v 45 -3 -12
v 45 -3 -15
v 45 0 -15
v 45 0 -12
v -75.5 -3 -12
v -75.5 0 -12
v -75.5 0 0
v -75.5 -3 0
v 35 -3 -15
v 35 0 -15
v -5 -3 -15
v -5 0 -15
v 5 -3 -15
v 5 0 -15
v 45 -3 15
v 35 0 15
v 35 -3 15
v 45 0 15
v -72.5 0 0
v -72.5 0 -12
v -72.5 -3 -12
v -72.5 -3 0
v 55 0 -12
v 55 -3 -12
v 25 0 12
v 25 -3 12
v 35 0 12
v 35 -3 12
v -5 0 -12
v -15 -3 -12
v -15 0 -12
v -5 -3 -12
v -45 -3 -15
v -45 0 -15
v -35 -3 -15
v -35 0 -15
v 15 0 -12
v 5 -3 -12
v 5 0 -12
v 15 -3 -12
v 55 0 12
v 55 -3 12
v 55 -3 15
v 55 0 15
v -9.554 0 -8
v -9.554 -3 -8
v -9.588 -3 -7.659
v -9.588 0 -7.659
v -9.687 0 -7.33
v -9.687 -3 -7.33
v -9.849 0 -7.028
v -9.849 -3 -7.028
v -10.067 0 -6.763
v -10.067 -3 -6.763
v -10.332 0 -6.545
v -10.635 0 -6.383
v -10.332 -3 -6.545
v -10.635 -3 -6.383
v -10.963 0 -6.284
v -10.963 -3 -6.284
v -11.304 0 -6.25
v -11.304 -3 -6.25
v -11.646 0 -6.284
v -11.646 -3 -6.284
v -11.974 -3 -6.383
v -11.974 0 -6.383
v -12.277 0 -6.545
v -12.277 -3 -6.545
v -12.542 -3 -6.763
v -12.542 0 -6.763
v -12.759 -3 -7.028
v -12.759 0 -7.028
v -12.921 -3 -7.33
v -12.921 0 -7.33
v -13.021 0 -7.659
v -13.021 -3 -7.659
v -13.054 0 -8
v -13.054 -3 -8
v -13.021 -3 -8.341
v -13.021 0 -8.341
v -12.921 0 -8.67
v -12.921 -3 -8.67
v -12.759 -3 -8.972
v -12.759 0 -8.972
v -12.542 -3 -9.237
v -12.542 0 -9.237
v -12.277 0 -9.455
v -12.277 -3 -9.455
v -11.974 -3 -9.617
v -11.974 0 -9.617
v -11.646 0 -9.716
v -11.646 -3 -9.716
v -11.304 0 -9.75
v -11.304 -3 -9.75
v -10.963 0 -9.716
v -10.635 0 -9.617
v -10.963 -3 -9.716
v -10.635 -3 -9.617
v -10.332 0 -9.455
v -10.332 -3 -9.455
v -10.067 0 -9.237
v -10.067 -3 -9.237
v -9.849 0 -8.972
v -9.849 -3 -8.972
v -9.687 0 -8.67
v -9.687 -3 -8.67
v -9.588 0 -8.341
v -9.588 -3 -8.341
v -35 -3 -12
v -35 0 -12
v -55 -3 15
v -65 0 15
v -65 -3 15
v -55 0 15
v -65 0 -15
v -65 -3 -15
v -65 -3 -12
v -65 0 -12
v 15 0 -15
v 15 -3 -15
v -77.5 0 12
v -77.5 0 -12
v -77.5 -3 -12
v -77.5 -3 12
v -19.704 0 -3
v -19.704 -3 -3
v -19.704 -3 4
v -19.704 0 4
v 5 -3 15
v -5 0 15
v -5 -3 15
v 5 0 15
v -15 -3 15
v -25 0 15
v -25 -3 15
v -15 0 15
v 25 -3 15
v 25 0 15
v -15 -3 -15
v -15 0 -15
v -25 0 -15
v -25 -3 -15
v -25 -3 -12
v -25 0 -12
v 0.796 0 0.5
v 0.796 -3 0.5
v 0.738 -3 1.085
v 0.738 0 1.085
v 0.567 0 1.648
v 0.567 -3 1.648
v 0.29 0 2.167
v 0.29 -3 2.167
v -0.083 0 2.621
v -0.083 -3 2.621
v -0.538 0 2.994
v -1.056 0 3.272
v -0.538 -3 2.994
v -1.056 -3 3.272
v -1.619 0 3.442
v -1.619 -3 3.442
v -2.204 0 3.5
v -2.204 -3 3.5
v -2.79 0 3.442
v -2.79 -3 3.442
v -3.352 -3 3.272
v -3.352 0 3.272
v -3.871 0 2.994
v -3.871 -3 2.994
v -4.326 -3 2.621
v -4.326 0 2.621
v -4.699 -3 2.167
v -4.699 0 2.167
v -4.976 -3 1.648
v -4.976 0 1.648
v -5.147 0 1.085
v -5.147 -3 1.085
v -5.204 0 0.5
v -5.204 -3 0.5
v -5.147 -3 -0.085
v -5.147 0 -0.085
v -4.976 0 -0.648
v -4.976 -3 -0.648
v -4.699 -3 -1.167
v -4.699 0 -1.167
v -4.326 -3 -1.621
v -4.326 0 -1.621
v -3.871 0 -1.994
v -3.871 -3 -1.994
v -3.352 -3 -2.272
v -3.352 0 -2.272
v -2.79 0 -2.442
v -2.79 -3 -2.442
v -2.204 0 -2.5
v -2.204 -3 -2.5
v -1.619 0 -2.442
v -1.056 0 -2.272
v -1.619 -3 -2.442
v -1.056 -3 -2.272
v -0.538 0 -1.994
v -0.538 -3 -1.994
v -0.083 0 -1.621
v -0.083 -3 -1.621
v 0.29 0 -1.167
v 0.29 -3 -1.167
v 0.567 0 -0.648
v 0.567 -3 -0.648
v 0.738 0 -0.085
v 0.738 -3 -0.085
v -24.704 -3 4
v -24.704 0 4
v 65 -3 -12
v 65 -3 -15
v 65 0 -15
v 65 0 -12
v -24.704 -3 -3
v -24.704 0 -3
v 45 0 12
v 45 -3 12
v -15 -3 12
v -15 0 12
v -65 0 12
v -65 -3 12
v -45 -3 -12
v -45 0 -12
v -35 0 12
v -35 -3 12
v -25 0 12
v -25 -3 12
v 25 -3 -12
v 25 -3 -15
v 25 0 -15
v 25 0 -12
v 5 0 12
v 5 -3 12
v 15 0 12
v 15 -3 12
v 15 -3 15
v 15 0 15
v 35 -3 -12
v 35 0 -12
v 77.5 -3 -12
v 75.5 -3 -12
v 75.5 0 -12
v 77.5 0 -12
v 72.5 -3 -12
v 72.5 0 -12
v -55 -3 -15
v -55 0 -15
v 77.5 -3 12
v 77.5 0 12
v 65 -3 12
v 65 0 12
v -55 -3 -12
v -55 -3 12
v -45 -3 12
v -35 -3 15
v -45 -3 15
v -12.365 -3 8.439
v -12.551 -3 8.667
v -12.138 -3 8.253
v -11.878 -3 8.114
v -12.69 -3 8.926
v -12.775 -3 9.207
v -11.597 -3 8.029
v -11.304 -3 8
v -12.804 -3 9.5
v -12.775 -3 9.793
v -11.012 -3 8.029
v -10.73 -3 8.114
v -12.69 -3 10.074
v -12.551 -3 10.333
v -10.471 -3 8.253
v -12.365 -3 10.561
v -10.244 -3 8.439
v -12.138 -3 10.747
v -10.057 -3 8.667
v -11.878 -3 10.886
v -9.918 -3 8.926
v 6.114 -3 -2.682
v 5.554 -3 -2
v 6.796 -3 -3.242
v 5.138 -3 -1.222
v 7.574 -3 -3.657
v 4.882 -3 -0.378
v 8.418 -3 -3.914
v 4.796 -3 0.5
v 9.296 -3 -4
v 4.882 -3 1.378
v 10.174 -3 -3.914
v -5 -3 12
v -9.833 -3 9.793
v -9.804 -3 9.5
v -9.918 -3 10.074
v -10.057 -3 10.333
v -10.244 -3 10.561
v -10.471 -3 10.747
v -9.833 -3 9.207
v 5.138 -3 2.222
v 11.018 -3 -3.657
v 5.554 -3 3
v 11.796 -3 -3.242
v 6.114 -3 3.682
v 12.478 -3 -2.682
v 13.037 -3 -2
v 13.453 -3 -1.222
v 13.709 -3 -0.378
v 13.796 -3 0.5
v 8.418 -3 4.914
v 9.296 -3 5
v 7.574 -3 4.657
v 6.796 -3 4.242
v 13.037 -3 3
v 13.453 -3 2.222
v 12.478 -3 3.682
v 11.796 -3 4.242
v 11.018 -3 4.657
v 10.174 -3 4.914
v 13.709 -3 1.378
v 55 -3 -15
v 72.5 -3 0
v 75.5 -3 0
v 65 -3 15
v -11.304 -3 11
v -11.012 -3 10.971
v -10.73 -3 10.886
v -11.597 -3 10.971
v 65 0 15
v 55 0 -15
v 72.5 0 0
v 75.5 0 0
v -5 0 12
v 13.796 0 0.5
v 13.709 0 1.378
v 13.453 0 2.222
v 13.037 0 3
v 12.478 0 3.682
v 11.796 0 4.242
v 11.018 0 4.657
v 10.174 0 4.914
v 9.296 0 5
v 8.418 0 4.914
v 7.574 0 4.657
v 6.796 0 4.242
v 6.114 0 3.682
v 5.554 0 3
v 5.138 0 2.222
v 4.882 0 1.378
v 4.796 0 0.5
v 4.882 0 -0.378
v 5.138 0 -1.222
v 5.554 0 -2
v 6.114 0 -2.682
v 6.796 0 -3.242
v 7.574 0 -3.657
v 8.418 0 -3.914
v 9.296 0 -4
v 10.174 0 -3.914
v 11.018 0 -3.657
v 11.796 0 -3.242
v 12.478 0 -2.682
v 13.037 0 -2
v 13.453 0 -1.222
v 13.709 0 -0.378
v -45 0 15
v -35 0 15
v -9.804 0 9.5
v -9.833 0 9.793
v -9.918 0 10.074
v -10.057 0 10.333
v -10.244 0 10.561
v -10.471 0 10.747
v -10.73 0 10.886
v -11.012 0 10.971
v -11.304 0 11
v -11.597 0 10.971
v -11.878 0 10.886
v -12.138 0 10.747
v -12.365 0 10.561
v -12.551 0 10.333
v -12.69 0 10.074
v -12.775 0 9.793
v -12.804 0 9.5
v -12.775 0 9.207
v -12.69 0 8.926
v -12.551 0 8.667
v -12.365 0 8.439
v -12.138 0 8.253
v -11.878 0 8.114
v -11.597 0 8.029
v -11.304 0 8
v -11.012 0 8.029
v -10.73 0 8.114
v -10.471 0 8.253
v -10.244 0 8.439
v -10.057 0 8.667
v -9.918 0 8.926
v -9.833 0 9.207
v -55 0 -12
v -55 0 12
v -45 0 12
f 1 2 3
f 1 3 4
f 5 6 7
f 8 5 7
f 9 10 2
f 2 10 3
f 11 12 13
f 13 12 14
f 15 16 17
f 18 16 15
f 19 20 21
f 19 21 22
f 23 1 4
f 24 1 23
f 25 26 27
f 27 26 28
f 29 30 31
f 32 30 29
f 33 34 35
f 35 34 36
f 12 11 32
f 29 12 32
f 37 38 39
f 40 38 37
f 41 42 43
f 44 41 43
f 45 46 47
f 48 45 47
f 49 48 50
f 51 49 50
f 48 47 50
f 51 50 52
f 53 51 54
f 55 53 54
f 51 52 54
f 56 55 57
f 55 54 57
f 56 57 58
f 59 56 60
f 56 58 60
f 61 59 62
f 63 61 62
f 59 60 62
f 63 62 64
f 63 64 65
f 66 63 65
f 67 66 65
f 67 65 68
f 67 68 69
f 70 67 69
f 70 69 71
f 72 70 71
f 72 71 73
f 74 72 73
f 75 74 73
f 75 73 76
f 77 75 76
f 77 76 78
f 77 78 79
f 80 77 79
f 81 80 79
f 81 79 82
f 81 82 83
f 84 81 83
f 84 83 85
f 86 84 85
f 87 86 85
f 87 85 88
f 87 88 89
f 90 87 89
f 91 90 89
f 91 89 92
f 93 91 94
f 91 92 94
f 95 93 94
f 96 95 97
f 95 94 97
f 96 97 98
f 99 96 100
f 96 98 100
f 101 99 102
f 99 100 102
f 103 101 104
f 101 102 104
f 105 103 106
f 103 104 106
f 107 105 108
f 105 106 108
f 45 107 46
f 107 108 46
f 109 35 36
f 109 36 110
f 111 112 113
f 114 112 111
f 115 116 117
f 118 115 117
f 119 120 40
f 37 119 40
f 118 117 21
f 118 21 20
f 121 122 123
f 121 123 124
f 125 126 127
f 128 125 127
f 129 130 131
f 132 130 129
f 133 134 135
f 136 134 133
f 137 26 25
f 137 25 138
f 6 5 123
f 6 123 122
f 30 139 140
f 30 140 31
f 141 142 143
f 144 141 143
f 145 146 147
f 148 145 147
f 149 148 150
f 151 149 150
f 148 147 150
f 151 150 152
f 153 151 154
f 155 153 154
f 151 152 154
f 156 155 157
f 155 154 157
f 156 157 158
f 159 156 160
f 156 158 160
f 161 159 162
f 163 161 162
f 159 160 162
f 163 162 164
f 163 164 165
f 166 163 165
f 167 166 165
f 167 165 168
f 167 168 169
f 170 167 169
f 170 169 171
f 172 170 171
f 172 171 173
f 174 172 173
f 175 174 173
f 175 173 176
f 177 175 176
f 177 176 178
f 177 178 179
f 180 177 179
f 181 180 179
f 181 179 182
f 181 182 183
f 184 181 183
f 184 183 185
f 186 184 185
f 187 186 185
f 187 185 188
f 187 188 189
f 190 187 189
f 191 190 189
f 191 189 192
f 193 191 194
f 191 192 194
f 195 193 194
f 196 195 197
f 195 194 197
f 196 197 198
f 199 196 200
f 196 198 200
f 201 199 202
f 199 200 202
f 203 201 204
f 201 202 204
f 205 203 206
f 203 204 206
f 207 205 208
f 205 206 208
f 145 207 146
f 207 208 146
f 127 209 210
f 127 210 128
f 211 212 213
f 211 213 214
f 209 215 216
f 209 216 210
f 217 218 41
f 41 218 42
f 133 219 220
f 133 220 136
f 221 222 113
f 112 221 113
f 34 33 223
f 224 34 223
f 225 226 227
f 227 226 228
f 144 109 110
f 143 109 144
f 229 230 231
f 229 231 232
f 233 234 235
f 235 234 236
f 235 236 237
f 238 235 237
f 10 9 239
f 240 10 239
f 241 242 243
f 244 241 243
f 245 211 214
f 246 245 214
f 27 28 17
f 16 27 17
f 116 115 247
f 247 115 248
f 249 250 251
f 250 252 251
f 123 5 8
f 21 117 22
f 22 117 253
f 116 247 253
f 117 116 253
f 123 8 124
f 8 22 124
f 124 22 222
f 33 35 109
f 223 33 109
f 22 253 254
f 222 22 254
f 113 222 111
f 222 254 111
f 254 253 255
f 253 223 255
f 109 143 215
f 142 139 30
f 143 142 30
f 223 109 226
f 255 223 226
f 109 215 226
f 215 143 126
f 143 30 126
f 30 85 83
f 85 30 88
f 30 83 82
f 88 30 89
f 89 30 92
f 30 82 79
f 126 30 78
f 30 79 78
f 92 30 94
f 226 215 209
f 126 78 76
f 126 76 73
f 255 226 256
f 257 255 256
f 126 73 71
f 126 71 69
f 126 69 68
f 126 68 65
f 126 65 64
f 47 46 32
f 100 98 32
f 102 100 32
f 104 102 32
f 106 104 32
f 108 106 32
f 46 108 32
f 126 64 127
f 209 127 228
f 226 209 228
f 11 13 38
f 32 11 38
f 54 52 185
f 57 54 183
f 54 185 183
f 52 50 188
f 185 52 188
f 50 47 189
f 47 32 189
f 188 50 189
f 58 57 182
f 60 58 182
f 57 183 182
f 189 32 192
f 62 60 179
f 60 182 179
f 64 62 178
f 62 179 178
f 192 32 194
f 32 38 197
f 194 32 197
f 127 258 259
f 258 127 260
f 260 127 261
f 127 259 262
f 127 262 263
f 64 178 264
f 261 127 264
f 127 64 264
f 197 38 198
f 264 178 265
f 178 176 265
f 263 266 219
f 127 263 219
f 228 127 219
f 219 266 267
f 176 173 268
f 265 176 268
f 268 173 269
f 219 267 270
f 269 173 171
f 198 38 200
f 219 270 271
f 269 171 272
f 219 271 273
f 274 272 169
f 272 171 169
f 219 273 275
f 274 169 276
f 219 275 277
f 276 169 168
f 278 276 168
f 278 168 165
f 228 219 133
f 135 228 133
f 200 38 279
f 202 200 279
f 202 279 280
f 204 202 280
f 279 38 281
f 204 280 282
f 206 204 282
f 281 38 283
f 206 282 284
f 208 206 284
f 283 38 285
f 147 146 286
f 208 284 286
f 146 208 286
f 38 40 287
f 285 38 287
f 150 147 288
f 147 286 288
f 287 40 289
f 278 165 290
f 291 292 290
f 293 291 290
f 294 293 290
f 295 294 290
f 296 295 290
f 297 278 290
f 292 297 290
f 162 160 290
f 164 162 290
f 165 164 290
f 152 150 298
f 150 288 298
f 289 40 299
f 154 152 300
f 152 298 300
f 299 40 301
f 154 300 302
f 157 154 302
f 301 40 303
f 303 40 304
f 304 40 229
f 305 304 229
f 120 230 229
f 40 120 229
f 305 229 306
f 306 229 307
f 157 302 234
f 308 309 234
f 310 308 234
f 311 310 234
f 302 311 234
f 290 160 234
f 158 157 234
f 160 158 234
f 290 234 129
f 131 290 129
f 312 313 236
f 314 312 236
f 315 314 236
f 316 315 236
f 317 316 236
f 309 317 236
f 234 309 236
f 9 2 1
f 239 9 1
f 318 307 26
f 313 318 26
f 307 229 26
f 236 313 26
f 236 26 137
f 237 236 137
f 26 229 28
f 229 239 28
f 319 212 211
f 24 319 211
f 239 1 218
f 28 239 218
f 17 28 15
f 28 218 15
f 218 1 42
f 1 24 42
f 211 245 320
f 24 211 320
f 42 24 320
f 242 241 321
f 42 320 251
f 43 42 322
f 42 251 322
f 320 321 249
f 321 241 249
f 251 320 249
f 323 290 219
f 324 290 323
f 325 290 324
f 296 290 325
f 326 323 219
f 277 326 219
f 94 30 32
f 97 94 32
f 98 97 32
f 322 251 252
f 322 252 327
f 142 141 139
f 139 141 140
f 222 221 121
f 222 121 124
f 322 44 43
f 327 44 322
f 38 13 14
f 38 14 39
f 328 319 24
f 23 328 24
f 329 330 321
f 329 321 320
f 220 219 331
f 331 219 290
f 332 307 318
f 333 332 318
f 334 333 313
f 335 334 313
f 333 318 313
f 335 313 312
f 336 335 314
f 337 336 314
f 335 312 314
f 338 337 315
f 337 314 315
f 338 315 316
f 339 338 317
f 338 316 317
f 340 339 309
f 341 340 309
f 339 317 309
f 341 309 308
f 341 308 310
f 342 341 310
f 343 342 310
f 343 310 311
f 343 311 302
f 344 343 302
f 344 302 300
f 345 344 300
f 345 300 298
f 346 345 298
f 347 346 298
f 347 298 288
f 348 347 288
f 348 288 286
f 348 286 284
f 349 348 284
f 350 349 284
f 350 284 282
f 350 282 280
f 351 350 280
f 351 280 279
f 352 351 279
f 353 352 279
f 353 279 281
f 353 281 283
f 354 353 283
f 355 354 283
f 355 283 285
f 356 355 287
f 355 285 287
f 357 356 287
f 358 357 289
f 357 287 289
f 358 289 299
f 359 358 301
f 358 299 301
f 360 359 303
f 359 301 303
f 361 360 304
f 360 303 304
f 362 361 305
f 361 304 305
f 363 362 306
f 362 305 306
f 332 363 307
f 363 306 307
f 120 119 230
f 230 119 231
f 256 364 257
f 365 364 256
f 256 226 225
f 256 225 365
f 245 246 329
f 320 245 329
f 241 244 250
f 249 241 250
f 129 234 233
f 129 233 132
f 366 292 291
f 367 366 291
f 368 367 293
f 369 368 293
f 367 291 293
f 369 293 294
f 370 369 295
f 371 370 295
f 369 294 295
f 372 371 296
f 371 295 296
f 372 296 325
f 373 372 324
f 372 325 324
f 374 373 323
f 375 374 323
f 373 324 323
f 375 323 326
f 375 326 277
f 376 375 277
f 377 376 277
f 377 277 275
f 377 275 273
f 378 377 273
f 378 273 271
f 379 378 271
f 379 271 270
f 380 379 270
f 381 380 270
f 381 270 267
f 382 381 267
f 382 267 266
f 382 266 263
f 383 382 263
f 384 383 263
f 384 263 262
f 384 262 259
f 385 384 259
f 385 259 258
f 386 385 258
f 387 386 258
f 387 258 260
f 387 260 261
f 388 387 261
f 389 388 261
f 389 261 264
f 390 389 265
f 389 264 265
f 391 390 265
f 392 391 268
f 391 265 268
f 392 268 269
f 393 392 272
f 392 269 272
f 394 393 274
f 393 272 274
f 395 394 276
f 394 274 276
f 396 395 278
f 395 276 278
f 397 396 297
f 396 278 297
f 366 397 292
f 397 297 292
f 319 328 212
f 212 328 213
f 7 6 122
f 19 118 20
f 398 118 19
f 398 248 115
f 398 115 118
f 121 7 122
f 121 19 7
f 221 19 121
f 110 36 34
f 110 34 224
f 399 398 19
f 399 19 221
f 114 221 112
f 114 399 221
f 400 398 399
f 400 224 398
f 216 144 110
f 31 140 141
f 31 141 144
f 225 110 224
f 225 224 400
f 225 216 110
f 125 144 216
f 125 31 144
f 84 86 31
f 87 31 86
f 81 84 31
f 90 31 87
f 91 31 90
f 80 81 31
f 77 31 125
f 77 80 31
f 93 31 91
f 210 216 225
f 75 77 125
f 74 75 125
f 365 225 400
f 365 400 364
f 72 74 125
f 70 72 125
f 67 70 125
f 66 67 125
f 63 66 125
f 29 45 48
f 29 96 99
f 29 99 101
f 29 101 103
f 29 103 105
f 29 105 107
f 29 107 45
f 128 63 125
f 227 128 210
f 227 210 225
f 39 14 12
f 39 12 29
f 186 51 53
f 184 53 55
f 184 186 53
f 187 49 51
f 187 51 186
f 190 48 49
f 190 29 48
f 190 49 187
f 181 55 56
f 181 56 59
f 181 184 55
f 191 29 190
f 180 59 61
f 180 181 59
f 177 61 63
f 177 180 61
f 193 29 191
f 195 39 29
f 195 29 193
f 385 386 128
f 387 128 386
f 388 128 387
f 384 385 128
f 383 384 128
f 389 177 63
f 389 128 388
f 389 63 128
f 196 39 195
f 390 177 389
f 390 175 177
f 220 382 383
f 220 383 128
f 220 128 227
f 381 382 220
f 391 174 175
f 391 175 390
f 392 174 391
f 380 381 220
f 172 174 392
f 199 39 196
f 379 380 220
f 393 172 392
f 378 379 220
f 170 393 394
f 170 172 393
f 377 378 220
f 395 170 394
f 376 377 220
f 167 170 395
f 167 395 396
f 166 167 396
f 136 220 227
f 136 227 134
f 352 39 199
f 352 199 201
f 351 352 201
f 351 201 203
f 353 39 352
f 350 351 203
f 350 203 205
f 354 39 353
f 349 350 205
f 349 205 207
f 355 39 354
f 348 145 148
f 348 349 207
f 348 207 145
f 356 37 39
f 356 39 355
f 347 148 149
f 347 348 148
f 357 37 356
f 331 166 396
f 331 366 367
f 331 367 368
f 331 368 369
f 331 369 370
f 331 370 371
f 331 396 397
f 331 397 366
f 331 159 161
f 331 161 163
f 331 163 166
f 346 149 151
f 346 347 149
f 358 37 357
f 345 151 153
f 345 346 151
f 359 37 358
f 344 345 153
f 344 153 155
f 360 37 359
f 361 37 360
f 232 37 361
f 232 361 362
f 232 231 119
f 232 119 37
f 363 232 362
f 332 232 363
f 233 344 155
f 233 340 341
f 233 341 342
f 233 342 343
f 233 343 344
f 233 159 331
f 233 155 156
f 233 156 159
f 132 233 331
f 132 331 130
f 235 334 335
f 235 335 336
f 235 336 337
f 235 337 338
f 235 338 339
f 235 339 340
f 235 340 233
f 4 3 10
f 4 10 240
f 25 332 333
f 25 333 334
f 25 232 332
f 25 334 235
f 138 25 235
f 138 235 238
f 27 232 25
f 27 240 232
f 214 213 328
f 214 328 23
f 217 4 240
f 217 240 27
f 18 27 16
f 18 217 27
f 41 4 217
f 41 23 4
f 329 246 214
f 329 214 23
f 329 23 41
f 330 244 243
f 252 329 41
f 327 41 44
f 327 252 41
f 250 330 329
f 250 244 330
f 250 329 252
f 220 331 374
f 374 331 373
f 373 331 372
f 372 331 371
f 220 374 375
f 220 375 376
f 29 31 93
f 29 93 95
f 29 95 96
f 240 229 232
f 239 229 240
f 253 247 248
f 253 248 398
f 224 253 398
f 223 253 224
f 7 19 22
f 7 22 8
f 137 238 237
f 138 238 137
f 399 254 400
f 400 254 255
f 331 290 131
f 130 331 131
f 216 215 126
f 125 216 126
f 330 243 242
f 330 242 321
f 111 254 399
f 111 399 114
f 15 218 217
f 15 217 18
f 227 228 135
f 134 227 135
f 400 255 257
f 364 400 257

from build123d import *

# Parameters (mm, degrees)
F0_W     = 151
F0_H     = 30
F1_DEPTH = 3
F2_W     = 5
F2_H     = 3
F2_W_2   = 6.4484283328
F2_W_3   = 10
F2_W_4   = 3.5515716672
F2_R     = 4.5
F2_R_2   = 1.5
F2_R_3   = 1.75
F2_R_4   = 3
F2_H_2   = 7
F3_DEPTH = 25
F4_DEPTH = 2
F5_DEPTH = 2
F6_W     = 3
F6_H     = 12
F7_DEPTH = 25


with BuildPart() as f1:
    # F0 (on Front) → F1 (new body)
    with BuildSketch(Plane.XZ):
        Rectangle(F0_W, F0_H)
    extrude(amount=F1_DEPTH)

    # F2 (on face) → F3 (cut)
    with BuildSketch(Plane.XZ.offset(3)):
        with Locations((-72.5, -13.5)):
            Rectangle(F2_W, F2_H)
        with Locations((-78.2242141664, -13.5)):
            Rectangle(F2_W_2, F2_H)
        with Locations((-67.5, -13.5)):
            Rectangle(F2_W, F2_H)
        with Locations((-72.5, 13.5)):
            Rectangle(F2_W, F2_H)
        with Locations((-78.2242141664, 13.5)):
            Rectangle(F2_W_2, F2_H)
        with Locations((-67.5, 13.5)):
            Rectangle(F2_W, F2_H)
        with Locations((-50, -13.5)):
            Rectangle(F2_W_3, F2_H)
        with Locations((-50, 13.5)):
            Rectangle(F2_W_3, F2_H)
        with Locations((-30, -13.5)):
            Rectangle(F2_W_3, F2_H)
        with Locations((-30, 13.5)):
            Rectangle(F2_W_3, F2_H)
        with Locations((-10, -13.5)):
            Rectangle(F2_W_3, F2_H)
        with Locations((-10, 13.5)):
            Rectangle(F2_W_3, F2_H)
        with Locations((10, -13.5)):
            Rectangle(F2_W_3, F2_H)
        with Locations((10, 13.5)):
            Rectangle(F2_W_3, F2_H)
        with Locations((30, -13.5)):
            Rectangle(F2_W_3, F2_H)
        with Locations((30, 13.5)):
            Rectangle(F2_W_3, F2_H)
        with Locations((50, -13.5)):
            Rectangle(F2_W_3, F2_H)
        with Locations((50, 13.5)):
            Rectangle(F2_W_3, F2_H)
        with Locations((66.7757858336, -13.5)):
            Rectangle(F2_W_4, F2_H)
        with Locations((71.7757858336, -13.5)):
            Rectangle(F2_W_2, F2_H)
        with Locations((77.5, -13.5)):
            Rectangle(F2_W, F2_H)
        with Locations((66.7757858336, 13.5)):
            Rectangle(F2_W_4, F2_H)
        with Locations((71.7757858336, 13.5)):
            Rectangle(F2_W_2, F2_H)
        with Locations((77.5, 13.5)):
            Rectangle(F2_W, F2_H)
        with Locations((9.2957439325, 0.5)):
            Circle(F2_R)
        with Locations((-11.3042560675, 9.5)):
            Circle(F2_R_2)
        with Locations((-11.3042560675, -8)):
            Circle(F2_R_3)
        with Locations((-2.2042560675, 0.5)):
            Circle(F2_R_4)
        with Locations((-22.2042560675, 0.5)):
            Rectangle(F2_W, F2_H_2)
    extrude(amount=-F3_DEPTH, mode=Mode.SUBTRACT)

    # F4 (add): a face of the model
    f4_faces = [f1.faces().sort_by_distance(p)[0] for p in [
        (75.5, -1.5, 0),
    ]]
    extrude(f4_faces, amount=F4_DEPTH)

    # F5 (add): a face of the model
    f5_faces = [f1.faces().sort_by_distance(p)[0] for p in [
        (-75.5, -1.5, 0),
    ]]
    extrude(f5_faces, amount=F5_DEPTH)

    # F6 (on face) → F7 (cut)
    with BuildSketch(Plane(origin=(0, 0, 0), x_dir=(-1, 0, 0), z_dir=(0, 1, 0))):
        with Locations((74, -6)):
            Rectangle(F6_W, F6_H)
        with Locations((-74, -6)):
            Rectangle(F6_W, F6_H)
    extrude(amount=-F7_DEPTH, mode=Mode.SUBTRACT)


solid = f1.part
